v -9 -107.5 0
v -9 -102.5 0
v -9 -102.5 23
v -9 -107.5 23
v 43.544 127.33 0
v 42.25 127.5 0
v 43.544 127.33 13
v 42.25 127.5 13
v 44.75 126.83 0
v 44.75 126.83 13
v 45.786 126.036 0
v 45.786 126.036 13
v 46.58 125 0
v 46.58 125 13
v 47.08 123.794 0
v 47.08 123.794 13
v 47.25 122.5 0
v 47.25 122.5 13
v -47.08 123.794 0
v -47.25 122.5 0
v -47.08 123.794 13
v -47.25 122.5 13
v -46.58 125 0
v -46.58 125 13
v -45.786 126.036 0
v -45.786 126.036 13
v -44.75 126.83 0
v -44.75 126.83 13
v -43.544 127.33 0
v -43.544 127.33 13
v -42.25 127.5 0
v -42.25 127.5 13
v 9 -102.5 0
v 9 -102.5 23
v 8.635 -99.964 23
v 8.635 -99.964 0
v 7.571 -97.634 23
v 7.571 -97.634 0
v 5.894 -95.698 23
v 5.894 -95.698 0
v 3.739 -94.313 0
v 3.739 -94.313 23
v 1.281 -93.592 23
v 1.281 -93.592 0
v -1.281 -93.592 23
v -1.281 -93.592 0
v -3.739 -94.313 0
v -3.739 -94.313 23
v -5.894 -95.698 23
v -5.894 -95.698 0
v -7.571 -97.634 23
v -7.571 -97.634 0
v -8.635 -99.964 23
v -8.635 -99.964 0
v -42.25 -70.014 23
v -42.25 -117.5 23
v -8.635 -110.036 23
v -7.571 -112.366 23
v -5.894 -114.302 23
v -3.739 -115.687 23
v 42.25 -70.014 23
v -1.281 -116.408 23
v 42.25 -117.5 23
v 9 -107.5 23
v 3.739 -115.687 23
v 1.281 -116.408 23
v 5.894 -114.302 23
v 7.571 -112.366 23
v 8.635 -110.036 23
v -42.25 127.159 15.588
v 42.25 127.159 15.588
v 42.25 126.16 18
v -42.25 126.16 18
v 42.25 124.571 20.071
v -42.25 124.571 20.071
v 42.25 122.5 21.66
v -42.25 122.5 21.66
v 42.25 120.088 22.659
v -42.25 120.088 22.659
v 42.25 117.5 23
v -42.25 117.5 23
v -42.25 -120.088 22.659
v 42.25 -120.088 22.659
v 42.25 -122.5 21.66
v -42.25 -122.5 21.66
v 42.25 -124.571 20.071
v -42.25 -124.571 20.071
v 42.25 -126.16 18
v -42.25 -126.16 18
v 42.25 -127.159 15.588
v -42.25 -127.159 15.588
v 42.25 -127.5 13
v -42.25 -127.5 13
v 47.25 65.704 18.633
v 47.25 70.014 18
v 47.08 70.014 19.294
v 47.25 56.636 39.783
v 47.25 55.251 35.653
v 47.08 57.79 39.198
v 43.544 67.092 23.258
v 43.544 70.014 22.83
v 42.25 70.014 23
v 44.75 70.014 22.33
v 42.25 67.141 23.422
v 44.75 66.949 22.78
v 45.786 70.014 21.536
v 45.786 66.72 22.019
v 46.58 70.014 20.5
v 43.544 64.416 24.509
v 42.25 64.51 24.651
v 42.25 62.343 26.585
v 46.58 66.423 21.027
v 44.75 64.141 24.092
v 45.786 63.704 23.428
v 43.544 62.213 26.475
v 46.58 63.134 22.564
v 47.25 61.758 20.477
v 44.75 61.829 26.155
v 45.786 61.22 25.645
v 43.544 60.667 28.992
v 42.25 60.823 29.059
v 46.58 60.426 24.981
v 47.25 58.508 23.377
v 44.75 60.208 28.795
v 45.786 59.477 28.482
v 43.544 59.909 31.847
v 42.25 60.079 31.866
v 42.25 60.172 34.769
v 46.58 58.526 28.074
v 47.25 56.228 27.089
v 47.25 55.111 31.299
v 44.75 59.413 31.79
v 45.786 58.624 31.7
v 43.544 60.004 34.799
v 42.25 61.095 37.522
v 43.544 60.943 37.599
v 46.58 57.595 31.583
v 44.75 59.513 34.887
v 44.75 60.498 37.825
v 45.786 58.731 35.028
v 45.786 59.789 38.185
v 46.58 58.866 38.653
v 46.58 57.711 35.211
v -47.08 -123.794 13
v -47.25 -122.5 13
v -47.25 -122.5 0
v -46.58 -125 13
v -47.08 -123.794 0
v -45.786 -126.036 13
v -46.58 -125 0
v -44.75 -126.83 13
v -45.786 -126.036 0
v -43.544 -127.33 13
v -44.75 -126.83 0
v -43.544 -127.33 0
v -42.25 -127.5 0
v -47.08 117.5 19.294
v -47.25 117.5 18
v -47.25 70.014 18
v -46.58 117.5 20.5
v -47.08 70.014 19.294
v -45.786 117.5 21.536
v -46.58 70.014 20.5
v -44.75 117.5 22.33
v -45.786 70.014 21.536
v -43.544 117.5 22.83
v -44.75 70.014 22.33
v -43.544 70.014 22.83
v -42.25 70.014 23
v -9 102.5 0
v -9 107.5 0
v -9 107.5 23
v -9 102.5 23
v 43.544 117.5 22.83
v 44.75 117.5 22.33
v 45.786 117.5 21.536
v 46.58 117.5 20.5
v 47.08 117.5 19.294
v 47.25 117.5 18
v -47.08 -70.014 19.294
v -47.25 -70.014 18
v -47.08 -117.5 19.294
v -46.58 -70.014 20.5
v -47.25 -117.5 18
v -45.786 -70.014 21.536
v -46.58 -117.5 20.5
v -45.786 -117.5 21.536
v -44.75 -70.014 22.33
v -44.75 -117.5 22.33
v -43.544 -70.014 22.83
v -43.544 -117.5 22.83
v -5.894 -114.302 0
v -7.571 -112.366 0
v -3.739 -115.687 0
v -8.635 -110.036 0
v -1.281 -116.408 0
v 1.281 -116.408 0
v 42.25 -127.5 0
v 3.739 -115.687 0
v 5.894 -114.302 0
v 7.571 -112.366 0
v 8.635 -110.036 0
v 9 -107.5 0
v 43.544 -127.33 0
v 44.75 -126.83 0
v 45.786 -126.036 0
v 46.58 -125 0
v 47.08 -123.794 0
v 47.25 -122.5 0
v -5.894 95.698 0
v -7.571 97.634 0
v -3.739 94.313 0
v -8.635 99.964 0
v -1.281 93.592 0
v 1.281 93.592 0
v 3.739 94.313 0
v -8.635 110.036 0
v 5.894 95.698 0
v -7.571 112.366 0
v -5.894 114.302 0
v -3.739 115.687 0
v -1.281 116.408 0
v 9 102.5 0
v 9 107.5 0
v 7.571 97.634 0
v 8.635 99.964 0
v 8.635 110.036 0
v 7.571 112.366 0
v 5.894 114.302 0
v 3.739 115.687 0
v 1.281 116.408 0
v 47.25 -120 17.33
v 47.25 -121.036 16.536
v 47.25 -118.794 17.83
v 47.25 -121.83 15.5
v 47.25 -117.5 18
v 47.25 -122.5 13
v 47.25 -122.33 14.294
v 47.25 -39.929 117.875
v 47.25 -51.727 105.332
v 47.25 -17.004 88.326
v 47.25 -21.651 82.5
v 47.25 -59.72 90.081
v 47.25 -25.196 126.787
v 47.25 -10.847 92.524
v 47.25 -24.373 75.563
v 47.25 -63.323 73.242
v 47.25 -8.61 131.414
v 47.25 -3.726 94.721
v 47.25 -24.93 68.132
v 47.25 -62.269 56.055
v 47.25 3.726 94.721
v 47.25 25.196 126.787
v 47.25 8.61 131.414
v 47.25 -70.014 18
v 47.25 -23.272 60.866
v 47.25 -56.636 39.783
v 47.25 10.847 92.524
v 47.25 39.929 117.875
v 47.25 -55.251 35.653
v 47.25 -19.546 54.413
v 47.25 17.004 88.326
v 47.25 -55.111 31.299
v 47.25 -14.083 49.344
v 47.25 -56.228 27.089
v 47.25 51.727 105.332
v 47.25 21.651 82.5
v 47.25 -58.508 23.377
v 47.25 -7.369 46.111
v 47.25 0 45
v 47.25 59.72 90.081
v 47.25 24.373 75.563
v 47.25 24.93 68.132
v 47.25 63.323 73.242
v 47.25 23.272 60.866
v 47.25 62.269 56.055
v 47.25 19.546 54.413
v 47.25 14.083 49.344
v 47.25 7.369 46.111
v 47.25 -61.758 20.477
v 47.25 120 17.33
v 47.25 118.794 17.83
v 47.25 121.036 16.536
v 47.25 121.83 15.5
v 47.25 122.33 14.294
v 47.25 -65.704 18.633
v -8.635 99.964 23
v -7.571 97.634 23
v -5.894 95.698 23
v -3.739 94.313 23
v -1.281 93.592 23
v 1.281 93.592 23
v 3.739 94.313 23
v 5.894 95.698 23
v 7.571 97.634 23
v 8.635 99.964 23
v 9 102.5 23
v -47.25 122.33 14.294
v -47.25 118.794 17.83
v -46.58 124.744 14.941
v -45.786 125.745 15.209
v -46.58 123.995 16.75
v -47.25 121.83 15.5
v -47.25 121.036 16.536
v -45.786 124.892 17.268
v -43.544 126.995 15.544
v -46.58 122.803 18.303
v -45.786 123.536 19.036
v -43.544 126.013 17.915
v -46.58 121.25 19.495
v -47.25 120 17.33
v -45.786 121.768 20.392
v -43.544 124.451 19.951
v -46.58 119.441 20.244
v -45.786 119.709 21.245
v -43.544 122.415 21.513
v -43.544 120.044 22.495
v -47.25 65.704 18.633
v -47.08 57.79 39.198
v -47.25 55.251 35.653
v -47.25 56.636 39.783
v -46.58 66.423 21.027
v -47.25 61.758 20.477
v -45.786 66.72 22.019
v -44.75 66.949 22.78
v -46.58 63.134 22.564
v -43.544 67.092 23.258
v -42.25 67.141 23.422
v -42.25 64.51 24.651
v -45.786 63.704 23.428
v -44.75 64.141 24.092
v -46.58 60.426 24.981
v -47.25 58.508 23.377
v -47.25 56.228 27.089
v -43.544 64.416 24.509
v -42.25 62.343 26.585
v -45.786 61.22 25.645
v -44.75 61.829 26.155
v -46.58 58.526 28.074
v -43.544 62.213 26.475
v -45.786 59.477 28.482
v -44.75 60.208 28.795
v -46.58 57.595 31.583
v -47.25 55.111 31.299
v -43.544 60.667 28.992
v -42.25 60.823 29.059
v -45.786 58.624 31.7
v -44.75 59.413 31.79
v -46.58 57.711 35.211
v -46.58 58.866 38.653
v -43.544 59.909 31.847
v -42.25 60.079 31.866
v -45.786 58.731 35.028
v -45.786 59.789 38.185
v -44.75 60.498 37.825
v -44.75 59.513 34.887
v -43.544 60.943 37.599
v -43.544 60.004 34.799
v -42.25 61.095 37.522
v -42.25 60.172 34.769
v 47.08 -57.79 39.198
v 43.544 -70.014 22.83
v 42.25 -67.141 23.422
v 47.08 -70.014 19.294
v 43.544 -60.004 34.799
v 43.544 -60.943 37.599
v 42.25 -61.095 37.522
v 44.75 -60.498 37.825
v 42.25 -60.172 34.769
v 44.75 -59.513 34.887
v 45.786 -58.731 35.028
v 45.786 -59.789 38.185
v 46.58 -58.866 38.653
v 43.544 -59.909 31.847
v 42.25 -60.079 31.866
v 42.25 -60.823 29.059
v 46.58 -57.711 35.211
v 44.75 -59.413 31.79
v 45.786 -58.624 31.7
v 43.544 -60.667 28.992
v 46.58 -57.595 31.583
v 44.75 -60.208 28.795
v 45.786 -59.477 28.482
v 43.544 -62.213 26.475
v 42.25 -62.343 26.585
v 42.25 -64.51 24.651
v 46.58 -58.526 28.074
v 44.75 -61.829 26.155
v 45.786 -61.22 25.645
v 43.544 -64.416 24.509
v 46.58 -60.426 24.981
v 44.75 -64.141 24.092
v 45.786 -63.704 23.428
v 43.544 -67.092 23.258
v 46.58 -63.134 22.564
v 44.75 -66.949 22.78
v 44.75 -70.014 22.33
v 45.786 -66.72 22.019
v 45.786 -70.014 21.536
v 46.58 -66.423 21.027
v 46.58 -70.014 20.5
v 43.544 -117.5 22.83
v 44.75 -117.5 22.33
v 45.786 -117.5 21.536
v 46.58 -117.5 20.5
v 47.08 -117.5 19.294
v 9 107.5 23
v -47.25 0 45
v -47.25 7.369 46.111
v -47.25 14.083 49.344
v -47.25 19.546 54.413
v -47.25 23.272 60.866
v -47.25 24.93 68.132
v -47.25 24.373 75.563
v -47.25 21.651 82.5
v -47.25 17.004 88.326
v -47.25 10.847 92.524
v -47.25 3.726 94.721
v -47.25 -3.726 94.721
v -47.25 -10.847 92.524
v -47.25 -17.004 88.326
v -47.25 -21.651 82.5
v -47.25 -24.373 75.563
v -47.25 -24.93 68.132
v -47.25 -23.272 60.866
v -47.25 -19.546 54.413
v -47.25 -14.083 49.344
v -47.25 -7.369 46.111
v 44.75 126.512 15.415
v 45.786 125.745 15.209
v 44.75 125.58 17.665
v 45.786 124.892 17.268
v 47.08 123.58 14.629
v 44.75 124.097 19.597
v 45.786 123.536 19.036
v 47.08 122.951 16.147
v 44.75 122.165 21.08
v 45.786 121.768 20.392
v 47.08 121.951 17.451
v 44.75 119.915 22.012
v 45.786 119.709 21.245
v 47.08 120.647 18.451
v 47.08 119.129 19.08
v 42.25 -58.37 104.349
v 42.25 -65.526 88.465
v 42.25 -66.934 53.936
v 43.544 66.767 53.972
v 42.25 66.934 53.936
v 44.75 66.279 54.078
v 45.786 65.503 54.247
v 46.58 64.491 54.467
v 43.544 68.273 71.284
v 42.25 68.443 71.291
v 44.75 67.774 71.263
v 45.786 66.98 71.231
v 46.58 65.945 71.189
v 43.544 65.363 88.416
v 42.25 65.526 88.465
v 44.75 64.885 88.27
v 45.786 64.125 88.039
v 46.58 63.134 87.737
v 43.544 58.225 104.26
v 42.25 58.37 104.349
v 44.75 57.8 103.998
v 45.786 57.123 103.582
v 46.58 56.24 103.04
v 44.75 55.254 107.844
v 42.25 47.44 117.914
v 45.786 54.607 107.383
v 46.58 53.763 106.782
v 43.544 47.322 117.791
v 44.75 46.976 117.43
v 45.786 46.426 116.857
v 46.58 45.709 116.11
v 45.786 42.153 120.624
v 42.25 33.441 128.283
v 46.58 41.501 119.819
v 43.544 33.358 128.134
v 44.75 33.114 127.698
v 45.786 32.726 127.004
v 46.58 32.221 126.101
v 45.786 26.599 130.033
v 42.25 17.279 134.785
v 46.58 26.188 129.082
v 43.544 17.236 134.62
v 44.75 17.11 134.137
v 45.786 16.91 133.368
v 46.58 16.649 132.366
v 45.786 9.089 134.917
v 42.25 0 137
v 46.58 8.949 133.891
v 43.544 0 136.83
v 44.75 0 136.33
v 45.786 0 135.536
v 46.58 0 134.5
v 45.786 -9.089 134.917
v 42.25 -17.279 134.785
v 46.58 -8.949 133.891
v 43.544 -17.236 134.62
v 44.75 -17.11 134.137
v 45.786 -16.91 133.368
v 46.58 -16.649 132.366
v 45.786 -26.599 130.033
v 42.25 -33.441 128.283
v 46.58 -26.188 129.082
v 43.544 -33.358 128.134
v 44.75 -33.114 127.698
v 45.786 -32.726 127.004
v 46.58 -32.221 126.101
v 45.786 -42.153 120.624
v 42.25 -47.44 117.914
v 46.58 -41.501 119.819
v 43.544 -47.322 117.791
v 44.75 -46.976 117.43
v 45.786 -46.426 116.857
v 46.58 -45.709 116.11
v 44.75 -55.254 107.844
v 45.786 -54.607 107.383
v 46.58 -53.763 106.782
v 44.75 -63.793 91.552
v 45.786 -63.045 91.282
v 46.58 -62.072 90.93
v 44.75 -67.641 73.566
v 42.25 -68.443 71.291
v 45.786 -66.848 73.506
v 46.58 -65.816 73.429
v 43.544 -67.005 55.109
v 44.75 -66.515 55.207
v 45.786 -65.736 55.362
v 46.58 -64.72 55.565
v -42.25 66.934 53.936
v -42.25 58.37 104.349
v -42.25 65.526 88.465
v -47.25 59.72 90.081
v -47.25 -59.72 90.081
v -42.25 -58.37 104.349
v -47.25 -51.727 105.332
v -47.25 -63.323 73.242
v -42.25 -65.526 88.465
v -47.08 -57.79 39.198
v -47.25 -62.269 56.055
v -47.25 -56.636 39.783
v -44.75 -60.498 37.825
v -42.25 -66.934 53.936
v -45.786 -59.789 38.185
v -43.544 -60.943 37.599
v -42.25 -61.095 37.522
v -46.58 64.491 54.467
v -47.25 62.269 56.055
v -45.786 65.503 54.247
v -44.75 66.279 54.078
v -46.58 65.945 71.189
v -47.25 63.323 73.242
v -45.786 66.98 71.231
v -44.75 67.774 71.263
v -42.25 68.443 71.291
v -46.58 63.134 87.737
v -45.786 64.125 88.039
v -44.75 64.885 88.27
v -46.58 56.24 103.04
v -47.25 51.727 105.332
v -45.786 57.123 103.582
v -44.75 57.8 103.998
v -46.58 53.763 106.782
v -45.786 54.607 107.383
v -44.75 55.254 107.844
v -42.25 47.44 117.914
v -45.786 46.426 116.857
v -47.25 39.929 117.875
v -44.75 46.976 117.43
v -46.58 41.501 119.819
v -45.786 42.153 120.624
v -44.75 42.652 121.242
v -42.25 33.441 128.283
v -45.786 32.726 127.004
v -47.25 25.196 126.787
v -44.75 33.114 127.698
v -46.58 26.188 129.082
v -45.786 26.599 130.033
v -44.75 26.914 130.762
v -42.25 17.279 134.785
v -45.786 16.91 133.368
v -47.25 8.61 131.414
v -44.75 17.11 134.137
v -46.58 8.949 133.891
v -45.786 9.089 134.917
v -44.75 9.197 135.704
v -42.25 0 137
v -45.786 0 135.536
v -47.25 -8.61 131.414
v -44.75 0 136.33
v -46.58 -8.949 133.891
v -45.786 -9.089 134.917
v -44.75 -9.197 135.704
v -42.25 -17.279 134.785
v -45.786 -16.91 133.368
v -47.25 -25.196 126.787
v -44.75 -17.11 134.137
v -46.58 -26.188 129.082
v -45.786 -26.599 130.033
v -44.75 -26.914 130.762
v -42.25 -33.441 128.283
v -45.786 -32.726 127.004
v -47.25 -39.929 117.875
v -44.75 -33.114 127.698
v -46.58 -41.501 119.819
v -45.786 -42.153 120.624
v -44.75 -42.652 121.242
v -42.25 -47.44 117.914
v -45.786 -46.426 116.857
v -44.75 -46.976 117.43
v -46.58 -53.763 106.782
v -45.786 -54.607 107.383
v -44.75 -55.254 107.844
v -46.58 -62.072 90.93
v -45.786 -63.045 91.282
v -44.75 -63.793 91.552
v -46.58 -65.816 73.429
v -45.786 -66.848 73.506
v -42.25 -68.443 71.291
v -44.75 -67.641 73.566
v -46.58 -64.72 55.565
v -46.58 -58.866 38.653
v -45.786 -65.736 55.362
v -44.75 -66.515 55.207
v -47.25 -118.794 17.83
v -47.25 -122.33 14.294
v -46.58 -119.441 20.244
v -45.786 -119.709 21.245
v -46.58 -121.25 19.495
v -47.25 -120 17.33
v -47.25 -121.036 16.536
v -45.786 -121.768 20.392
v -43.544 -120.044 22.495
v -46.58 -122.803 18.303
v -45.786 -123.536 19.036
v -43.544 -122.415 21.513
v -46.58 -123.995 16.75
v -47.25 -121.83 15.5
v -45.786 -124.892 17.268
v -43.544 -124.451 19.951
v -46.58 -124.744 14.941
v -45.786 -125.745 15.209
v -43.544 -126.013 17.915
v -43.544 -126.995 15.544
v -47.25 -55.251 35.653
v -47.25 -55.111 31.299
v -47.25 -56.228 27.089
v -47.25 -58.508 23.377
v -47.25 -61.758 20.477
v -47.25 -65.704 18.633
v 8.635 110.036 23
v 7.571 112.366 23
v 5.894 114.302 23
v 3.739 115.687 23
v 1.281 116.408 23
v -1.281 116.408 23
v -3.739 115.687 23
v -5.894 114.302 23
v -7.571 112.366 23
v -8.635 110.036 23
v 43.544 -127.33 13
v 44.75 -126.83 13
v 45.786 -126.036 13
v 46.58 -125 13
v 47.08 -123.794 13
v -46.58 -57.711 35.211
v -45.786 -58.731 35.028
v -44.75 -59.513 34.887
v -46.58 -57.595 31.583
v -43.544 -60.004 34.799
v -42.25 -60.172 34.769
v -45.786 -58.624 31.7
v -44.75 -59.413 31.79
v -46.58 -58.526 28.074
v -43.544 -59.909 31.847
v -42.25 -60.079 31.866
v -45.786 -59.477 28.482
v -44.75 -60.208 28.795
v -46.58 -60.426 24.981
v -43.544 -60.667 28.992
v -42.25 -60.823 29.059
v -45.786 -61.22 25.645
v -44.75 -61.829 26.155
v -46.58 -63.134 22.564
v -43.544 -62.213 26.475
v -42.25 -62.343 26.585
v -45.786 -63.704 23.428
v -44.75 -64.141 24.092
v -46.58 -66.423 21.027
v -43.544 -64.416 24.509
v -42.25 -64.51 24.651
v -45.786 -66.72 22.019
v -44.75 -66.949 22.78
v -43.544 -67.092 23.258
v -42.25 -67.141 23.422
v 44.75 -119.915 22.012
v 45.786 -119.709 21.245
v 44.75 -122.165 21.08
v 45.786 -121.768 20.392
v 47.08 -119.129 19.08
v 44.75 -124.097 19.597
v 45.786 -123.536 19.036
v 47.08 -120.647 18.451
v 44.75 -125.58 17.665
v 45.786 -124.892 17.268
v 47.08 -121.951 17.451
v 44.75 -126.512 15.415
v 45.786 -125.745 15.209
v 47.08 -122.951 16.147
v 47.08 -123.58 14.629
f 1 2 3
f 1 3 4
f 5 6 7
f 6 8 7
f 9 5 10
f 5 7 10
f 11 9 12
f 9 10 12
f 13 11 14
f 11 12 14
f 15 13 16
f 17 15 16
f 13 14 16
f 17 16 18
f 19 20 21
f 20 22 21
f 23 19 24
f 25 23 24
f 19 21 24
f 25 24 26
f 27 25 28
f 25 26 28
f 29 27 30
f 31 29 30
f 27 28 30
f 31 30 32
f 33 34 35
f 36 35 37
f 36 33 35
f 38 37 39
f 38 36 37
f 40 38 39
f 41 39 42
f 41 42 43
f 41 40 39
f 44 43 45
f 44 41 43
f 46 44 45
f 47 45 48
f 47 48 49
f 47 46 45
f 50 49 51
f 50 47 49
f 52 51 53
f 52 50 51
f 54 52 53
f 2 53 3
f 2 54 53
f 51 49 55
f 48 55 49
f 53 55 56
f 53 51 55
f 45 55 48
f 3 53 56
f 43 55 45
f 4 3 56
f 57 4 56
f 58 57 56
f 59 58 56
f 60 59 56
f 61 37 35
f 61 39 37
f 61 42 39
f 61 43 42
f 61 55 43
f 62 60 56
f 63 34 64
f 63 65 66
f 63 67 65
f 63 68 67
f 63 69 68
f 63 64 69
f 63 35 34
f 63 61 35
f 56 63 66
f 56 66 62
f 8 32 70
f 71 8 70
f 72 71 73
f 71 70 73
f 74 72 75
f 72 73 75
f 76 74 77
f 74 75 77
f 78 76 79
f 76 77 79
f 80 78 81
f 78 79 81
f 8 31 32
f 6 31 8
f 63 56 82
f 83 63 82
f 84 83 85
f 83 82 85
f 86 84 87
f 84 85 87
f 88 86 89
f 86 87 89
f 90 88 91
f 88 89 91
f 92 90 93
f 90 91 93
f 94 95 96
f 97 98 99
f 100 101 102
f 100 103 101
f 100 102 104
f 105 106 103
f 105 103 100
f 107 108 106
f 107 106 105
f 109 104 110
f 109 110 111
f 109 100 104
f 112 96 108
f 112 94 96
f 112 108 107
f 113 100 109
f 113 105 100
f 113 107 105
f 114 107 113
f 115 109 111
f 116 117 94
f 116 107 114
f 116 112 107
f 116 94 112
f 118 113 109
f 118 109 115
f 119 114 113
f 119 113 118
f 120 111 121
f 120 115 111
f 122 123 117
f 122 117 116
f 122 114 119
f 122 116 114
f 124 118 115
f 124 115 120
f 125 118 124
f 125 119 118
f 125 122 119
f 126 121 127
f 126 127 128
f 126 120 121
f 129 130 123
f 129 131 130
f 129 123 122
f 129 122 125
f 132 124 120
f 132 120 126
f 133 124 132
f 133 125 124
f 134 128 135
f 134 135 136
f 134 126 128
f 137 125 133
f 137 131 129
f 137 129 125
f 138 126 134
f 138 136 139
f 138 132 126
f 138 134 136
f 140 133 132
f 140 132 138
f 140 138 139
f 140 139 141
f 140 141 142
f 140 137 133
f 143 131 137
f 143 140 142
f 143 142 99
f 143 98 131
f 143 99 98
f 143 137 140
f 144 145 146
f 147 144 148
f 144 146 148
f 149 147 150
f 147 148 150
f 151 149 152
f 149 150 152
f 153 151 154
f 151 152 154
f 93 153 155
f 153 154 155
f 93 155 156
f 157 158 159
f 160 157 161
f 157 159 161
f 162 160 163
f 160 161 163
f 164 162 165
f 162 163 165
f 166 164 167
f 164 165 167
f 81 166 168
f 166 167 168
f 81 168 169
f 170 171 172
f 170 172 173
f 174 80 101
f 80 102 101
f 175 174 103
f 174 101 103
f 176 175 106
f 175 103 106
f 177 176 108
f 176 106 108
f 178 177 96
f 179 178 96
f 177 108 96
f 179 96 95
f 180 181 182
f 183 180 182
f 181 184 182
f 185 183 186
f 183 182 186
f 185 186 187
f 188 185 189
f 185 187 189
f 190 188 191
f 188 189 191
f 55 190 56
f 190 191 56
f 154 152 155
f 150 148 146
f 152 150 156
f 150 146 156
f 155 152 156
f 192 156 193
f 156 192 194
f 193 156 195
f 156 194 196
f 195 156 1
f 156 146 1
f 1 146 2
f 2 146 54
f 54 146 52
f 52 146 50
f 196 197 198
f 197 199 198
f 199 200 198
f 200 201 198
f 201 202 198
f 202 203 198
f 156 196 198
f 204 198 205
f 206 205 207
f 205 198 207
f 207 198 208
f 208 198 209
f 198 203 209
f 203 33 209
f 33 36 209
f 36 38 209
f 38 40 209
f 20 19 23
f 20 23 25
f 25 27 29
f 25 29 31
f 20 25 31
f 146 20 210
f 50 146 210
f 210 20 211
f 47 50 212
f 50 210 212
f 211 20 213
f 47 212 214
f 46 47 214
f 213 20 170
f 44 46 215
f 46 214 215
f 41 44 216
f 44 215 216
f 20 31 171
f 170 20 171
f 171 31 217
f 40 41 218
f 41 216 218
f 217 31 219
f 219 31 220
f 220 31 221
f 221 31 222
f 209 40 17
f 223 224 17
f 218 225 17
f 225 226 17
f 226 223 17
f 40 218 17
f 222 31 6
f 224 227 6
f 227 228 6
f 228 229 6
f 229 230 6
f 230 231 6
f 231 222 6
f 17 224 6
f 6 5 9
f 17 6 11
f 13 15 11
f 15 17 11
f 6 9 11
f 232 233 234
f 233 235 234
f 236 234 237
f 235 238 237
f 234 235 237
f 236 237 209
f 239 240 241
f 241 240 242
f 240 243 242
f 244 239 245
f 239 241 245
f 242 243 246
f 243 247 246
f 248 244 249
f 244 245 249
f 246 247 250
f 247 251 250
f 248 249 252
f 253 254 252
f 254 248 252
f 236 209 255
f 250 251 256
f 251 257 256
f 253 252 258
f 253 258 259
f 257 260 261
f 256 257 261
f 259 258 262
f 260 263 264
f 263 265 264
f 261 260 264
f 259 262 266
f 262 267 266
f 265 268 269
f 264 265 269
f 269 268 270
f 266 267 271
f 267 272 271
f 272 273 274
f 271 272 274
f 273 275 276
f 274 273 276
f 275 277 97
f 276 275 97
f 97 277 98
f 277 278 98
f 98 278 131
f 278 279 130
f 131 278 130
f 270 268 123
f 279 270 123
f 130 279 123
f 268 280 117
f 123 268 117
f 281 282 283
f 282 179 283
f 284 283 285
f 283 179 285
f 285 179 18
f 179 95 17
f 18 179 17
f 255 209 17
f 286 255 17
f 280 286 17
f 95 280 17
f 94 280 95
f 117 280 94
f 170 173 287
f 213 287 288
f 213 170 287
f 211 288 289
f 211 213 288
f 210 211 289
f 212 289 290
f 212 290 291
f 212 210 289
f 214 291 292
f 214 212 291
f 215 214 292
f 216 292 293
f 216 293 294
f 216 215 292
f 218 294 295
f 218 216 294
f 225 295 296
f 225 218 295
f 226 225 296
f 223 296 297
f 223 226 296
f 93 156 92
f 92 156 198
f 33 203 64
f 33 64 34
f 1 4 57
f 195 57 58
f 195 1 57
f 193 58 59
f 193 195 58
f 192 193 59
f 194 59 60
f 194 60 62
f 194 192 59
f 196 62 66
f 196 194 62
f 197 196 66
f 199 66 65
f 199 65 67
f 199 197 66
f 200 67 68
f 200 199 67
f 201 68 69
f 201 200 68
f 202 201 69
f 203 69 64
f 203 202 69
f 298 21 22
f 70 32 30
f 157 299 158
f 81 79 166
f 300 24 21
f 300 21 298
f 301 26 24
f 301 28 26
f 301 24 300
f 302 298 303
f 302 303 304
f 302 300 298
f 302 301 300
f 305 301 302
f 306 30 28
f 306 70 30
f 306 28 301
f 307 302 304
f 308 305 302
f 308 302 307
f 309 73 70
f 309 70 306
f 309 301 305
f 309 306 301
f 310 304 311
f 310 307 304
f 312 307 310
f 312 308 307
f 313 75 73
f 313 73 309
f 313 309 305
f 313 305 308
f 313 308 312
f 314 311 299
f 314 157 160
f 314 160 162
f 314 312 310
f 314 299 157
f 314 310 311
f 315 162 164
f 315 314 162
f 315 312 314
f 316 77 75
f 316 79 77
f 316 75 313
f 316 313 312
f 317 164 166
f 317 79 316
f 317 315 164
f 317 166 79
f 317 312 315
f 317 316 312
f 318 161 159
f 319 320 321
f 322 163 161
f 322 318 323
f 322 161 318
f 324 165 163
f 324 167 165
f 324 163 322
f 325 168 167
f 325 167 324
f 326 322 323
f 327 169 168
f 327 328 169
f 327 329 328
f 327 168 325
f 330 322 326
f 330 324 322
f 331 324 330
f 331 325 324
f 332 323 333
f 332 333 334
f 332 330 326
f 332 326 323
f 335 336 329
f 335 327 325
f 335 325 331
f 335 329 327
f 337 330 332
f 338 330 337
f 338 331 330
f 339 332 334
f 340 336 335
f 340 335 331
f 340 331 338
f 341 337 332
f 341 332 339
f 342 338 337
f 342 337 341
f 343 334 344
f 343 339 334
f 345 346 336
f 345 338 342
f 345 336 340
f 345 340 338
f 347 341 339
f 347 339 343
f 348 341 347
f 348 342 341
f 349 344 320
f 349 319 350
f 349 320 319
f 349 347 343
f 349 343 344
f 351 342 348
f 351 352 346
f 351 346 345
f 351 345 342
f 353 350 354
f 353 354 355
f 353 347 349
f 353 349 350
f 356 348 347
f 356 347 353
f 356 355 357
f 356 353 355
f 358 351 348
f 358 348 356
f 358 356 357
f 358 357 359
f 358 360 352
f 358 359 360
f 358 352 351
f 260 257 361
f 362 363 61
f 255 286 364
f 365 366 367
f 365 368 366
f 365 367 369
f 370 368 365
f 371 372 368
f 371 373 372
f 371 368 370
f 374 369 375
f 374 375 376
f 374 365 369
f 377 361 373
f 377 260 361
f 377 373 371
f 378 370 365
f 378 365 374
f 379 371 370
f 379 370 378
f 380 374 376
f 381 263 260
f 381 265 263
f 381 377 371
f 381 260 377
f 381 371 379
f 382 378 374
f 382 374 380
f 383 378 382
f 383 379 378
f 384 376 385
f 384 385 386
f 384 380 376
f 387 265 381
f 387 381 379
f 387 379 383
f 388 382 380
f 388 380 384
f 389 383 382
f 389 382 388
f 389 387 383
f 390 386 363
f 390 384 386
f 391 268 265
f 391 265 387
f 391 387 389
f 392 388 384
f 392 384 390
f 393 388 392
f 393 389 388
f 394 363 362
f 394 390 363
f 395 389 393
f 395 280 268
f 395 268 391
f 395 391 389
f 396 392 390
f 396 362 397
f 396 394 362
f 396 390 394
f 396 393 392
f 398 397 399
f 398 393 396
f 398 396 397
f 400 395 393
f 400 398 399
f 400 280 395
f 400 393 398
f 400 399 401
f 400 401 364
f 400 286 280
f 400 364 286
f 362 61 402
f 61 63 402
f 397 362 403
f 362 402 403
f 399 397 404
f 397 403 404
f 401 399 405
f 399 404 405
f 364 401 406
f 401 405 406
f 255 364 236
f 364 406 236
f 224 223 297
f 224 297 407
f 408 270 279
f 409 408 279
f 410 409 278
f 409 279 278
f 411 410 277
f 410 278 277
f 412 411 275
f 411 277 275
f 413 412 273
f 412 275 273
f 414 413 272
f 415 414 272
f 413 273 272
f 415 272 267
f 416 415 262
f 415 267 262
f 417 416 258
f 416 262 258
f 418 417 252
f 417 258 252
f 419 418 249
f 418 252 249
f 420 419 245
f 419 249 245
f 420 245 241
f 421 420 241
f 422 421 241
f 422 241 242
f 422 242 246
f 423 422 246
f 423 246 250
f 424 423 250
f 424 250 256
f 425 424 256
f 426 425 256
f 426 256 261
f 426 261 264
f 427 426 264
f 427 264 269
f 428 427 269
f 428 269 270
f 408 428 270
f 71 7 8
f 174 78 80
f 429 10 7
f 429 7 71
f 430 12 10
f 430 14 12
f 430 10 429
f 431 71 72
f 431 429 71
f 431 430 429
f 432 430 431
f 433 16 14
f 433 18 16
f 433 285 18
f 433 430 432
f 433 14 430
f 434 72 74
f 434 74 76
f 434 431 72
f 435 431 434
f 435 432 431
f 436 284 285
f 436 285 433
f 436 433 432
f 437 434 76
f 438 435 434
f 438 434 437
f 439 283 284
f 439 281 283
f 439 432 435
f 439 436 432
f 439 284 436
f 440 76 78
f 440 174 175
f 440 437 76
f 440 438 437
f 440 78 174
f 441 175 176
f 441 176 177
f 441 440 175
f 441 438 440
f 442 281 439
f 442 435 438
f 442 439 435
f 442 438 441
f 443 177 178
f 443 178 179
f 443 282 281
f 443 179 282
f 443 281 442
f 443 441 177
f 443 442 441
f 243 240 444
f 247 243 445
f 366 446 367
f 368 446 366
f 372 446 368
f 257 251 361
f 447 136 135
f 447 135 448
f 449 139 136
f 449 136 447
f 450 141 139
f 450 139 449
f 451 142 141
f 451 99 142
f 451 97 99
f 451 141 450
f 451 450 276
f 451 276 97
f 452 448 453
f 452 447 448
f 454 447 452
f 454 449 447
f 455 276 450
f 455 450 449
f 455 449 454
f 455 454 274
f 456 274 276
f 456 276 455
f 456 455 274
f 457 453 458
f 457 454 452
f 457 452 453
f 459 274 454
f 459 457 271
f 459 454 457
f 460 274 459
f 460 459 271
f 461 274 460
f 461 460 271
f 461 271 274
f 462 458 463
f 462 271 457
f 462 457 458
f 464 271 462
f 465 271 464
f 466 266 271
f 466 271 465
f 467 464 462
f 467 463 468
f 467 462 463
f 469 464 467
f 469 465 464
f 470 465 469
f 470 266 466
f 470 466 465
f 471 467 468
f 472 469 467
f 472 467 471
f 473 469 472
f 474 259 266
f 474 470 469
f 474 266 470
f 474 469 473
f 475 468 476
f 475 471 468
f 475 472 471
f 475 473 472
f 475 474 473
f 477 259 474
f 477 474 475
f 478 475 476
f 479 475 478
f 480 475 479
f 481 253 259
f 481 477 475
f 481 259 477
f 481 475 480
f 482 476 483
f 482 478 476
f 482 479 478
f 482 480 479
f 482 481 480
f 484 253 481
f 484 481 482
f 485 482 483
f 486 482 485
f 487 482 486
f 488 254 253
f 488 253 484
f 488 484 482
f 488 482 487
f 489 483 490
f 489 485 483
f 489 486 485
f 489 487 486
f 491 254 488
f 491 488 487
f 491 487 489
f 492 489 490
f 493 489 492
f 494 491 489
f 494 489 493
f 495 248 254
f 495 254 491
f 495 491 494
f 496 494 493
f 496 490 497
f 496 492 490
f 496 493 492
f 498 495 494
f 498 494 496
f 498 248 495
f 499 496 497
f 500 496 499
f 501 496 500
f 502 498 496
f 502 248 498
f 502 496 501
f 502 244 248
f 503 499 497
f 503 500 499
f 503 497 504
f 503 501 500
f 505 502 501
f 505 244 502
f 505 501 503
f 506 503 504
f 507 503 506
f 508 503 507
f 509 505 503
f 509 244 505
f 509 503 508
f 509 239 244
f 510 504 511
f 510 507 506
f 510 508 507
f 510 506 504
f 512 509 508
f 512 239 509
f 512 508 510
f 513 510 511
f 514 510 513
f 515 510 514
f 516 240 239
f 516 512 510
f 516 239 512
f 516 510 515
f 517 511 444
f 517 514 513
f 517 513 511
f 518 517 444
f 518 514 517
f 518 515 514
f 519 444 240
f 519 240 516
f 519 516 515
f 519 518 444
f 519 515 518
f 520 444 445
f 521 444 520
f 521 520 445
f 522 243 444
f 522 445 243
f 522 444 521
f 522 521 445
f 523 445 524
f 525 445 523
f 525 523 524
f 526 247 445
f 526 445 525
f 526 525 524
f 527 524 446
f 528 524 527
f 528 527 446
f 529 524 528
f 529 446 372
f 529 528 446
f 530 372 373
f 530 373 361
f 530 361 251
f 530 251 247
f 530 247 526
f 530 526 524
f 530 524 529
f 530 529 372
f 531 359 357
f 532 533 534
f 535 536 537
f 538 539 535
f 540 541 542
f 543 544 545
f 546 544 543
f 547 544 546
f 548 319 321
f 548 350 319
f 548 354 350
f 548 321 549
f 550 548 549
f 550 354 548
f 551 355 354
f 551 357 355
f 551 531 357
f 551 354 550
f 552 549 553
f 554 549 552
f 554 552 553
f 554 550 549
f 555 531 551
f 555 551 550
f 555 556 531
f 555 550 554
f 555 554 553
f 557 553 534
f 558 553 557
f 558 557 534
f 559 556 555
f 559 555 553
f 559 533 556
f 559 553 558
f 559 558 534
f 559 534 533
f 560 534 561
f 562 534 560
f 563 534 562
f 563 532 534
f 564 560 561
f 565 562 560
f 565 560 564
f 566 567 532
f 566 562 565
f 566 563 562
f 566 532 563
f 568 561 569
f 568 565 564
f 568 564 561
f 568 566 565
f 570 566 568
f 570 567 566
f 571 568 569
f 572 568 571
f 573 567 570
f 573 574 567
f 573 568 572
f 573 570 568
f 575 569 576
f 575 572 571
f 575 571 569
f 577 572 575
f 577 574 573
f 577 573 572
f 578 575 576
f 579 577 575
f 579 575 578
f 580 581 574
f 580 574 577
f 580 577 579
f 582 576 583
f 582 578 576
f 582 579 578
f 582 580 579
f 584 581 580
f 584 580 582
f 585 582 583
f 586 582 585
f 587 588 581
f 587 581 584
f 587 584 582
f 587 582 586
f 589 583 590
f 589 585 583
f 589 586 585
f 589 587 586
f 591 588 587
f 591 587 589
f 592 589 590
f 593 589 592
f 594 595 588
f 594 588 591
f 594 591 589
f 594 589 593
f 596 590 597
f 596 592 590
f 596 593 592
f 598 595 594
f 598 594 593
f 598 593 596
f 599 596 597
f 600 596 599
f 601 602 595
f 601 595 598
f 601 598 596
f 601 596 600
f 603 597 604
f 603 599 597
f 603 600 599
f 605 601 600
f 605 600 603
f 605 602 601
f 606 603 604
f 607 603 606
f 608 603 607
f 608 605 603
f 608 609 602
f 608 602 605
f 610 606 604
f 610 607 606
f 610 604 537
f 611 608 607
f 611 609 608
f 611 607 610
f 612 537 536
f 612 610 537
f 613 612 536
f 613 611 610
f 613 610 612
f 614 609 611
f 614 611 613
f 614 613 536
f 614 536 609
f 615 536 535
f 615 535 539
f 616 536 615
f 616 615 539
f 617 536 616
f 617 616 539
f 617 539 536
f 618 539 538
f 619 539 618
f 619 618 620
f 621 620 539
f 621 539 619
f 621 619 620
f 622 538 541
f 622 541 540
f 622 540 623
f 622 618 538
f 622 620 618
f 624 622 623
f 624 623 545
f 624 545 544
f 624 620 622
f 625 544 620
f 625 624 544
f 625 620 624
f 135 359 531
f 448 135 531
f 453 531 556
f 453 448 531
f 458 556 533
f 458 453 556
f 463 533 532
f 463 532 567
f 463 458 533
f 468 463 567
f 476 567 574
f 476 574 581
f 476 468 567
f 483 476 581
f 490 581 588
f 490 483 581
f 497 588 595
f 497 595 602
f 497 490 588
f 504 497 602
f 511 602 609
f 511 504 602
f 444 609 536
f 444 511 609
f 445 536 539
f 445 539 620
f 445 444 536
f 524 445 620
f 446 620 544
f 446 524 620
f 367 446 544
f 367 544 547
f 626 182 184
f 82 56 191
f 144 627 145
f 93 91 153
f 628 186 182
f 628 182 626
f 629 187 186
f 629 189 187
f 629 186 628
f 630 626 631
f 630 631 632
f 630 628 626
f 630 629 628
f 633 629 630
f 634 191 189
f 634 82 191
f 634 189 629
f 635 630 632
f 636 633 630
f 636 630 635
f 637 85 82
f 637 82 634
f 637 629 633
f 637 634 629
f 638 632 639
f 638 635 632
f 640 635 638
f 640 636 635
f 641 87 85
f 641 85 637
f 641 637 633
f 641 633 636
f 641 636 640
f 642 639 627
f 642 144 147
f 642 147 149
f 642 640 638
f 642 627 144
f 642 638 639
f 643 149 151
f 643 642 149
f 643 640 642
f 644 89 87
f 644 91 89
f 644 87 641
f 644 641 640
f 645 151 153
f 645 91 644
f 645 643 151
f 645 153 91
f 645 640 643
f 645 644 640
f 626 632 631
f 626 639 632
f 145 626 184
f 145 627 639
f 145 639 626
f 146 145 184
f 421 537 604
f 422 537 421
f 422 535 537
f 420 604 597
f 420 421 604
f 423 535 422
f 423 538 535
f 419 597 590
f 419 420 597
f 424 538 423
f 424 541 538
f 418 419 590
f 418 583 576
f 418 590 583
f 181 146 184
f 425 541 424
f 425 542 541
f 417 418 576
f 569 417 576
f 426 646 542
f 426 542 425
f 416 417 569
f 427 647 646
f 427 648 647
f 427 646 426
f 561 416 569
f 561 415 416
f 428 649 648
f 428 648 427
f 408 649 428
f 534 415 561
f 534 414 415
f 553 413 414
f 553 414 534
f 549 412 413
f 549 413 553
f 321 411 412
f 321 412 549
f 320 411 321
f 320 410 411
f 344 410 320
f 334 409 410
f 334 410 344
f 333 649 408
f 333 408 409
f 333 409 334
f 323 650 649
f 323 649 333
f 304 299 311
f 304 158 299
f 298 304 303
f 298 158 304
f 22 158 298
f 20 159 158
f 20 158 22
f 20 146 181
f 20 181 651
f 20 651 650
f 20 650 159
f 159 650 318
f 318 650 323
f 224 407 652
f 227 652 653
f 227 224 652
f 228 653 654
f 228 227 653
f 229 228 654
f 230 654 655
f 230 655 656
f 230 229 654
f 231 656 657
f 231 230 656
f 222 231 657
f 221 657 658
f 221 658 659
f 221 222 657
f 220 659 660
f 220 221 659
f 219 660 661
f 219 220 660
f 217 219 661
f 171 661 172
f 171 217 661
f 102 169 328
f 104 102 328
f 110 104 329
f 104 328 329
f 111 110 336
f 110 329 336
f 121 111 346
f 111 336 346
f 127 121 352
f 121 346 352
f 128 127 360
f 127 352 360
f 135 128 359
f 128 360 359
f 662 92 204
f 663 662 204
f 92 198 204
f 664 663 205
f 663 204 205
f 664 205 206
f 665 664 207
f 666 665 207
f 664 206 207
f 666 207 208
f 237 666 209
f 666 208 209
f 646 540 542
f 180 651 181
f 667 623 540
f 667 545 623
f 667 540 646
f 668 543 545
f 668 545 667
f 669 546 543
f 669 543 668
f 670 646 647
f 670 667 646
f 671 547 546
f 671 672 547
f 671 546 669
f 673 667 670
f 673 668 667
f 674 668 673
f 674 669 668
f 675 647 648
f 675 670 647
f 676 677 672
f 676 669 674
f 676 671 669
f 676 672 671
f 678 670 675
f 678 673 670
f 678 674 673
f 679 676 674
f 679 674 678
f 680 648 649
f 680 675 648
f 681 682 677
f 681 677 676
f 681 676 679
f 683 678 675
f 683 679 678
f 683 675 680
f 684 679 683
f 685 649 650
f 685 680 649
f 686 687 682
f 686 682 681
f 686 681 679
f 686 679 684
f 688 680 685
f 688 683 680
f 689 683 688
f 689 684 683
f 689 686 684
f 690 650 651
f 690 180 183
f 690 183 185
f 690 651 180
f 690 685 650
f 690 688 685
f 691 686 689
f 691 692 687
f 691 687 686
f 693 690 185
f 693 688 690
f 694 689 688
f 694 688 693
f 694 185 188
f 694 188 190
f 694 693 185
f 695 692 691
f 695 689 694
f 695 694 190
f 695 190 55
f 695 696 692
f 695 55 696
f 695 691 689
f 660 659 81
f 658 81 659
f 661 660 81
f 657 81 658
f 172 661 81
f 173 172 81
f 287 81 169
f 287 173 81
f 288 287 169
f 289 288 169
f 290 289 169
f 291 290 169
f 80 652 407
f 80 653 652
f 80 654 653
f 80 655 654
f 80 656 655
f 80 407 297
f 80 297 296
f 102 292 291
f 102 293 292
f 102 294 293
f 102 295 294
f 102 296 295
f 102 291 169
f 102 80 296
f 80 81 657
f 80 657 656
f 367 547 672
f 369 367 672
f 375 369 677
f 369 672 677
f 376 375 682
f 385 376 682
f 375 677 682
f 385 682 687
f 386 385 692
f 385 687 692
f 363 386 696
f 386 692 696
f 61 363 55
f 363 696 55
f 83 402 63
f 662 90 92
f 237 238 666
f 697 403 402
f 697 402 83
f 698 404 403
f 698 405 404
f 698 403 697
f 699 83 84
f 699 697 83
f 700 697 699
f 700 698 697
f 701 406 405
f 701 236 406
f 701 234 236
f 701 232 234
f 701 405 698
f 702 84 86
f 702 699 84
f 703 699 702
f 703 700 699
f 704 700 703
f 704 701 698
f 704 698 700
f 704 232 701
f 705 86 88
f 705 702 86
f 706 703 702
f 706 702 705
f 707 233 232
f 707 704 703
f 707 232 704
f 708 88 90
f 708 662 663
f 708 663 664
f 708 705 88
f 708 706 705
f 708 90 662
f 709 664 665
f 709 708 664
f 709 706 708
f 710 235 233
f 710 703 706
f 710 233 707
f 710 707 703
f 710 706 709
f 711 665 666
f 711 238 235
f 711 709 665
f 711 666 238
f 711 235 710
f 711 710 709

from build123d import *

# Parameters (mm, degrees)
SKETCH_1_W          = 94.5
SKETCH_1_H          = 255
EXTRUDE_1_DEPTH     = 137
SKETCH_2_OUTSIDE_W  = 199.902
SKETCH_2_OUTSIDE_H  = 317.902
CUT_EXTRUDE_1_DEPTH = 137
FILLET_1_R          = 10
FILLET_2_R          = 5
SKETCH_3_R          = 25
CUT_EXTRUDE_2_DEPTH = 210.655670133
CUT_EXTRUDE_3_DEPTH = 23


with BuildPart() as part:
    # 草图1 → 凸台-拉伸1 (new body)
    with BuildSketch(Plane.XY):
        Rectangle(SKETCH_1_W, SKETCH_1_H)
    extrude(amount=EXTRUDE_1_DEPTH)

    # 草图2 outside → 切除-拉伸1 (cut)
    with BuildSketch(Plane(origin=(47.25, 0, 0), x_dir=(0, 0, -1), z_dir=(1, 0, 0))):
        with Locations((-68.5, 0)):
            Rectangle(SKETCH_2_OUTSIDE_W, SKETCH_2_OUTSIDE_H)
        with BuildLine():
            Line((0, -127.5), (0, 127.5))
            Line((0, 127.5), (-23, 127.5))
            Line((-23, 127.5), (-23, 51.205468458))
            ThreePointArc((-23, 51.205468458), (-137, 0), (-23, -51.205468458))
            Line((-23, -51.205468458), (-23, -127.5))
            Line((-23, -127.5), (0, -127.5))
        make_face(mode=Mode.SUBTRACT)
    extrude(amount=-CUT_EXTRUDE_1_DEPTH, mode=Mode.SUBTRACT)

    # 圆角1
    fillet_1_edges = [part.edges().sort_by_distance(p)[0] for p in [
        (0, 127.5, 23),
        (0, -51.205468458, 23),
        (0, 51.205468458, 23),
        (0, -127.5, 23),
    ]]
    fillet(fillet_1_edges, radius=FILLET_1_R)

    # 圆角2
    fillet_2_edges = [part.edges().sort_by_distance(p)[0] for p in [
        (47.25, 127.5, 6.5),
        (-47.25, 127.5, 6.5),
        (47.25, -93.757142128, 23),
        (47.25, -127.5, 6.5),
        (47.25, 93.757142128, 23),
        (47.25, 0, 137),
        (47.25, -124.571067812, 20.071067812),
        (47.25, 124.571067812, 20.071067812),
        (-47.25, 93.757142128, 23),
        (-47.25, -93.757142128, 23),
        (-47.25, 0, 137),
        (-47.25, -127.5, 6.5),
        (-47.25, -124.571067812, 20.071067812),
        (-47.25, 124.571067812, 20.071067812),
        (47.25, 61.493048139, 27.766594318),
        (-47.25, 61.493048139, 27.766594318),
        (47.25, -61.493048139, 27.766594318),
        (-47.25, -61.493048139, 27.766594318),
    ]]
    fillet(fillet_2_edges, radius=FILLET_2_R)

    # 草图3 → 切除-拉伸2 (cut, through all)
    with BuildSketch(Plane(origin=(47.25, 0, 0), x_dir=(0, 0, -1), z_dir=(1, 0, 0))):
        with Locations((-70, 0)):
            Circle(SKETCH_3_R)
    extrude(amount=-CUT_EXTRUDE_2_DEPTH, mode=Mode.SUBTRACT)

    # 草图4 → 切除-拉伸3 (cut)
    with BuildSketch(Plane(origin=(0, 0, 0), x_dir=(-1, 0, 0), z_dir=(0, 0, -1))):
        with BuildLine():
            Line((9, 107.5), (9, 102.5))
            ThreePointArc((9, 102.5), (0, 93.5), (-9, 102.5))
            Line((-9, 102.5), (-9, 107.5))
            ThreePointArc((-9, 107.5), (0, 116.5), (9, 107.5))
        make_face()
        with BuildLine():
            Line((-9, -107.5), (-9, -102.5))
            ThreePointArc((-9, -102.5), (0, -93.5), (9, -102.5))
            Line((9, -102.5), (9, -107.5))
            ThreePointArc((9, -107.5), (0, -116.5), (-9, -107.5))
        make_face()
    extrude(amount=-CUT_EXTRUDE_3_DEPTH, mode=Mode.SUBTRACT)


solid = part.part
